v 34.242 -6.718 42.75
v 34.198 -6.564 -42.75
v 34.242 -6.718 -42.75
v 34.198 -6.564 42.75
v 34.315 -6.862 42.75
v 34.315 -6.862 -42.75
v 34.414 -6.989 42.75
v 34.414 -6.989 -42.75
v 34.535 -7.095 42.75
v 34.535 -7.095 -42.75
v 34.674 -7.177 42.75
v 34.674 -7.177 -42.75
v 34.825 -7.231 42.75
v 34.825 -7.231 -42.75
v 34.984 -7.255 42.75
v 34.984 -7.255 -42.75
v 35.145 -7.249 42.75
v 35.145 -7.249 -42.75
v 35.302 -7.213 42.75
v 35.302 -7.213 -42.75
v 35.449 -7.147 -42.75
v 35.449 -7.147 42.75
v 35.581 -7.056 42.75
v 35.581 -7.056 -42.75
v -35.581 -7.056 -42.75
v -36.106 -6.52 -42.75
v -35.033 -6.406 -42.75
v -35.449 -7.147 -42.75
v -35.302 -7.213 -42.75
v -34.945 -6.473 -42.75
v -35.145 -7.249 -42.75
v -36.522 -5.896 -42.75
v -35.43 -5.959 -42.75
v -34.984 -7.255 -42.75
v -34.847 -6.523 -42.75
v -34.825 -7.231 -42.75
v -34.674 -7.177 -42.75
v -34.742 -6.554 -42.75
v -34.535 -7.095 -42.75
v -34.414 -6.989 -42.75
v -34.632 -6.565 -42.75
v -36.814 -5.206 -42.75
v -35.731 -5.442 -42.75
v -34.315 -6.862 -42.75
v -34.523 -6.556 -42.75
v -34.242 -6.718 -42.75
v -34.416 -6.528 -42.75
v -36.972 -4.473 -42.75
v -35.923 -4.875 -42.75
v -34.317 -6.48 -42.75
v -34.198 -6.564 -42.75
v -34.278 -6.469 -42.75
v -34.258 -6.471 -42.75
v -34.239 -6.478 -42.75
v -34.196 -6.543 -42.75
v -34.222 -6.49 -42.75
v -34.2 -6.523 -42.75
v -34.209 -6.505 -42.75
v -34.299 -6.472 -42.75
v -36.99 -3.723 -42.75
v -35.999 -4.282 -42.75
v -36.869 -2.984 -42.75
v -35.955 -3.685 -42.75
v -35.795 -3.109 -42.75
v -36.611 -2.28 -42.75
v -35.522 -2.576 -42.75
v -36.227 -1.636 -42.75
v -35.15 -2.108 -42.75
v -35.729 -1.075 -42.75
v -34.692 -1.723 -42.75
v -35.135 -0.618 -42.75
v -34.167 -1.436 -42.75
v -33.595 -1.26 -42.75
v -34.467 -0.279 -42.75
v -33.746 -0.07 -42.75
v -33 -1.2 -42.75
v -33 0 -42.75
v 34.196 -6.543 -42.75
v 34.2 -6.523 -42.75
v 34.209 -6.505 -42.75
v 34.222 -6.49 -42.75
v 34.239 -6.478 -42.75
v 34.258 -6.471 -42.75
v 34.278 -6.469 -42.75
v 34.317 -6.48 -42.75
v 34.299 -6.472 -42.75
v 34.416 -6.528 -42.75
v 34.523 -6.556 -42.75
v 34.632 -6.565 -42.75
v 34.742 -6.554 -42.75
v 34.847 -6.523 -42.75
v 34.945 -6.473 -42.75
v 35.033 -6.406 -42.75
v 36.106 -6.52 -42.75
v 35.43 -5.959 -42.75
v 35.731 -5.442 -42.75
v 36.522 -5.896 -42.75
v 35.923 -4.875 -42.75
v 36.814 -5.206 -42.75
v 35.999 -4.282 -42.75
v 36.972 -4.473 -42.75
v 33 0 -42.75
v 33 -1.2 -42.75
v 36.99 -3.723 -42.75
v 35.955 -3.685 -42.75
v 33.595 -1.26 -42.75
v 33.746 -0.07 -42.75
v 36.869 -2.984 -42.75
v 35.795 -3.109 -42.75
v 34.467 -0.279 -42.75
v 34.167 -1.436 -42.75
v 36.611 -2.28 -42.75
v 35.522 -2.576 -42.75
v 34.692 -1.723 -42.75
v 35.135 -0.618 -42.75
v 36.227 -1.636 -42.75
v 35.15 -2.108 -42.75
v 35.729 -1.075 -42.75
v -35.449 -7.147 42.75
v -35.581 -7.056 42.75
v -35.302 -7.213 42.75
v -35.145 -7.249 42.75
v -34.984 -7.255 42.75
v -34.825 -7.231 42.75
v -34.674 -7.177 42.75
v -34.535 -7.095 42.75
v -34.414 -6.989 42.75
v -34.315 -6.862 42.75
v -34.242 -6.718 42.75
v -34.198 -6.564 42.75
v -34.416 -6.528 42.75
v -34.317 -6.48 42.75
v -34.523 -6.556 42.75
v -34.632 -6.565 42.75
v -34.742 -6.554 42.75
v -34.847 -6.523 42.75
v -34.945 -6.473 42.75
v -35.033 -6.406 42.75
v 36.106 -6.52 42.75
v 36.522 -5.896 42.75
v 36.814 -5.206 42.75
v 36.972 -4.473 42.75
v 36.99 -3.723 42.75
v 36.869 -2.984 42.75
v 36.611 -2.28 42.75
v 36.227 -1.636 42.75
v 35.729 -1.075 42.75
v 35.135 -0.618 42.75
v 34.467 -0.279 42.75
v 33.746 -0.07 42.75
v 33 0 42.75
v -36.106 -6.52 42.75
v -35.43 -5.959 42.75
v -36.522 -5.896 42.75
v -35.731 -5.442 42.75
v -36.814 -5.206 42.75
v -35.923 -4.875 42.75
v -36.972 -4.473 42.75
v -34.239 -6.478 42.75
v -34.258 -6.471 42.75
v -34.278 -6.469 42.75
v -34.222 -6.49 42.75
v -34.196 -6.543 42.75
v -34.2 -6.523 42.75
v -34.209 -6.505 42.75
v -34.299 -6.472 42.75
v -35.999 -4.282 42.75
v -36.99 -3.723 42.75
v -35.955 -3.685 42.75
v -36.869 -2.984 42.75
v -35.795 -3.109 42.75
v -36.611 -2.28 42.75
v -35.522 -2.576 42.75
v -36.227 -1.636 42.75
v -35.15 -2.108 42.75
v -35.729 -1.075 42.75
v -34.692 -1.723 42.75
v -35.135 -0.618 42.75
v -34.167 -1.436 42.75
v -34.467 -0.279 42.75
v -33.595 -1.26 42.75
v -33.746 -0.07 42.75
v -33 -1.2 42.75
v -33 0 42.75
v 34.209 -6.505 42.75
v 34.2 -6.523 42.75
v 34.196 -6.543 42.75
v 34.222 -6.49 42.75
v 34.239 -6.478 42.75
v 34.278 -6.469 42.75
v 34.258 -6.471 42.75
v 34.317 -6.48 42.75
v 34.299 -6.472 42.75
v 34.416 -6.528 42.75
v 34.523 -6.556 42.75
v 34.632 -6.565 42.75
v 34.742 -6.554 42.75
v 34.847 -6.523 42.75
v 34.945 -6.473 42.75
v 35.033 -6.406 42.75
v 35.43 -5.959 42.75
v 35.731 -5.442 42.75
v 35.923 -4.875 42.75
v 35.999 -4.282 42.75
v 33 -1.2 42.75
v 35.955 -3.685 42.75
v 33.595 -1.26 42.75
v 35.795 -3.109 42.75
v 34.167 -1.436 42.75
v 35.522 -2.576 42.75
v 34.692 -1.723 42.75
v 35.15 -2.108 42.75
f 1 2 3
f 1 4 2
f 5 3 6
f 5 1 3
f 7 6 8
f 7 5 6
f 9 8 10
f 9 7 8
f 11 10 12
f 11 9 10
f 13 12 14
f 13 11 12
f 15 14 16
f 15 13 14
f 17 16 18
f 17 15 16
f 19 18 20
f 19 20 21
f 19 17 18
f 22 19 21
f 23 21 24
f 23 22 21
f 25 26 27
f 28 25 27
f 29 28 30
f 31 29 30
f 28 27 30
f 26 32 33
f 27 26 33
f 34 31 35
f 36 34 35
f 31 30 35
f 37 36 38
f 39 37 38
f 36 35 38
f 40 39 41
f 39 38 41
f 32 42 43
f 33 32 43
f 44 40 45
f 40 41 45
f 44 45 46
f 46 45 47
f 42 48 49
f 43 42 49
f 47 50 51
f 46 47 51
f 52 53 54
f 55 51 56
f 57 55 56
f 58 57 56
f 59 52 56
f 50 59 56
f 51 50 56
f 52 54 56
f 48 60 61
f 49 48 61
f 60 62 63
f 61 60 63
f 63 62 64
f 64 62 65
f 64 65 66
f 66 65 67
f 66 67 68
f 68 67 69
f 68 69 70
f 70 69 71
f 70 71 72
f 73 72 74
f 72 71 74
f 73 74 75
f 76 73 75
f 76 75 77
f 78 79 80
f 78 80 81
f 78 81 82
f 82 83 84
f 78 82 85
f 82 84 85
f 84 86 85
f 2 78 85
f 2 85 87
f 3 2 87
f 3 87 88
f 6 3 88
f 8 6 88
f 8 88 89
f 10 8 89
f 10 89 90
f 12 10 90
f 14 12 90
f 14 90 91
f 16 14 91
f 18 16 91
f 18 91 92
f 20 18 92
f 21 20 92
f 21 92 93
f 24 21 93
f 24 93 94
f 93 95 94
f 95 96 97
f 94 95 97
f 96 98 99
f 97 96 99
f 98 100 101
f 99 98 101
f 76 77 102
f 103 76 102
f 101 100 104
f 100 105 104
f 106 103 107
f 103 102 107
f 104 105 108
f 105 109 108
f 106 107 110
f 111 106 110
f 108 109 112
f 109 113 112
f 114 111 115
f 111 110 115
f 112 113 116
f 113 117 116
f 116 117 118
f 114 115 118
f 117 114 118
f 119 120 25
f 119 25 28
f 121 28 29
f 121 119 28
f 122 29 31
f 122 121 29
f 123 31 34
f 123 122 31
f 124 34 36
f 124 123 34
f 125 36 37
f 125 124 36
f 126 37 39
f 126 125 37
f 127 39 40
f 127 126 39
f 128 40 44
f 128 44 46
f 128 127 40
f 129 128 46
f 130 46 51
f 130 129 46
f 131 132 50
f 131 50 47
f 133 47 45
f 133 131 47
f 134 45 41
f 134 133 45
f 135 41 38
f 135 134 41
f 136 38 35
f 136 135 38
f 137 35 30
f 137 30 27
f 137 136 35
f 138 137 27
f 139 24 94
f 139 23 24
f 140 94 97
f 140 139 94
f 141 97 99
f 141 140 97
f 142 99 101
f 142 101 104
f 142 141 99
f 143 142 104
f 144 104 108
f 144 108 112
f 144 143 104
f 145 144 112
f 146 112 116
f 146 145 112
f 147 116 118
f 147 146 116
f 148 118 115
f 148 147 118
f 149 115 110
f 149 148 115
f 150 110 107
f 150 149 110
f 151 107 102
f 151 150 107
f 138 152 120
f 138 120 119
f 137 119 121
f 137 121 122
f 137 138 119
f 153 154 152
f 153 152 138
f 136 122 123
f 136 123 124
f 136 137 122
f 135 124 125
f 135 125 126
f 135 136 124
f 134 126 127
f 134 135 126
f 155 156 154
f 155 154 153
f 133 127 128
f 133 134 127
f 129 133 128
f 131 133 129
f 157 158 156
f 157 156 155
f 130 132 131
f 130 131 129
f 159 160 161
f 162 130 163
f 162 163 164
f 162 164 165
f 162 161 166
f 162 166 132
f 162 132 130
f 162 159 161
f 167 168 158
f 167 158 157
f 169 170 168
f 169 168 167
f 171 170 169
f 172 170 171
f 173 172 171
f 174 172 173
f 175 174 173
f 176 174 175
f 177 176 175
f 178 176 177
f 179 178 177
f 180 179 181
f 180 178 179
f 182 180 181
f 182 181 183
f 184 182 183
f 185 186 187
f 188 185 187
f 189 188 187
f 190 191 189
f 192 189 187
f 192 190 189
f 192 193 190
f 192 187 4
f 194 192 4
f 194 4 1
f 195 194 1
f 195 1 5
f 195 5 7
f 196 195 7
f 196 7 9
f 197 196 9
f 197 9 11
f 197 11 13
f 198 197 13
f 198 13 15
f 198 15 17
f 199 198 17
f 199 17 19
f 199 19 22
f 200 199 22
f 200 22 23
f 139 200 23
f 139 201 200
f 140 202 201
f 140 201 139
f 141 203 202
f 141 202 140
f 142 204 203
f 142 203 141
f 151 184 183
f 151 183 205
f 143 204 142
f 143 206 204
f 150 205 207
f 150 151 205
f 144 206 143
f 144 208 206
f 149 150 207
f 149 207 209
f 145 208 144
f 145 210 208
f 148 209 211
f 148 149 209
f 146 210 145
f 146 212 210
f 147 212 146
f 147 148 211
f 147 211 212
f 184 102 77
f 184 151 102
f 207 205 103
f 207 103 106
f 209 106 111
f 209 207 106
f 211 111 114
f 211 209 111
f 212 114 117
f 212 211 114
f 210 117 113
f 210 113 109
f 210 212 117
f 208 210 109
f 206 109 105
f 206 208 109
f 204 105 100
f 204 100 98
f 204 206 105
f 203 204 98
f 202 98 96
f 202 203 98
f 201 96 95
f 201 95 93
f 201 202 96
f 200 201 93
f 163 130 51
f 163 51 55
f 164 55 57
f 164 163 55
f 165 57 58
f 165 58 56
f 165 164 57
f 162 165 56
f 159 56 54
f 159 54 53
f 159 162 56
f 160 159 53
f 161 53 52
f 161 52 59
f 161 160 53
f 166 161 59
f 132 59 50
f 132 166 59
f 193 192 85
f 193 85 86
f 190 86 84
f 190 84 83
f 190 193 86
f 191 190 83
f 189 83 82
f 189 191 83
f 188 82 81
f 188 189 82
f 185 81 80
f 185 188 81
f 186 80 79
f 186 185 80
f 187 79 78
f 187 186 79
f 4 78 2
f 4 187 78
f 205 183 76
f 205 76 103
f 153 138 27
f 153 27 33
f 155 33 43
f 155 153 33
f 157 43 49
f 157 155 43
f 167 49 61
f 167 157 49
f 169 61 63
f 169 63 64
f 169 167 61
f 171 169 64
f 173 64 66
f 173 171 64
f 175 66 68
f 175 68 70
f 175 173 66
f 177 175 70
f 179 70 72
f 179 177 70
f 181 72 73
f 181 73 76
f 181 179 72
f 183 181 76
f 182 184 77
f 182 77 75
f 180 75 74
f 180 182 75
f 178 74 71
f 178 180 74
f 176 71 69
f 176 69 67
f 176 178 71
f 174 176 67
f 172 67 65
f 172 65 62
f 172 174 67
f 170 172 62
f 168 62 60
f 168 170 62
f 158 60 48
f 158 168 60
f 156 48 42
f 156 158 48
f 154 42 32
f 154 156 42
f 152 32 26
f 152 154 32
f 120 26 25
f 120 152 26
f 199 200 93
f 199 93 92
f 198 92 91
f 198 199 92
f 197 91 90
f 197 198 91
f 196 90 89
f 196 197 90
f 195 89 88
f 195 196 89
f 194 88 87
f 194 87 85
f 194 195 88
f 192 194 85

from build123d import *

# Parameters (mm, degrees)
EXTRUDE_1_DEPTH = 42.75


with BuildPart() as part:
    # ｽｹｯﾁ1 → ﾎﾞｽ - 押し出し1 (new, symmetric)
    with BuildSketch(Plane.XY):
        with BuildLine():
            Line((33, 0), (-33, 0))
            ThreePointArc((-33, 0), (-36.75647589, -2.625631458), (-35.581391146, -7.055555556))
            ThreePointArc((-35.581391146, -7.055555556), (-34.748138628, -7.207150732), (-34.197540305, -6.563619582))
            ThreePointArc((-34.197540305, -6.563619582), (-34.230384711, -6.483196795), (-34.317201966, -6.480140047))
            ThreePointArc((-34.317201966, -6.480140047), (-34.687300356, -6.562097055), (-35.032845527, -6.40625))
            ThreePointArc((-35.032845527, -6.40625), (-35.794525899, -3.108842358), (-33, -1.2))
            Line((-33, -1.2), (33, -1.2))
            ThreePointArc((33, -1.2), (35.794525899, -3.108842358), (35.032845527, -6.40625))
            ThreePointArc((35.032845527, -6.40625), (34.687300356, -6.562097055), (34.317201966, -6.480140047))
            ThreePointArc((34.317201966, -6.480140047), (34.230384711, -6.483196795), (34.197540305, -6.563619582))
            ThreePointArc((34.197540305, -6.563619582), (34.748138628, -7.207150732), (35.581391146, -7.055555556))
            ThreePointArc((35.581391146, -7.055555556), (36.75647589, -2.625631458), (33, 0))
        make_face()
    extrude(amount=EXTRUDE_1_DEPTH, both=True)


solid = part.part
